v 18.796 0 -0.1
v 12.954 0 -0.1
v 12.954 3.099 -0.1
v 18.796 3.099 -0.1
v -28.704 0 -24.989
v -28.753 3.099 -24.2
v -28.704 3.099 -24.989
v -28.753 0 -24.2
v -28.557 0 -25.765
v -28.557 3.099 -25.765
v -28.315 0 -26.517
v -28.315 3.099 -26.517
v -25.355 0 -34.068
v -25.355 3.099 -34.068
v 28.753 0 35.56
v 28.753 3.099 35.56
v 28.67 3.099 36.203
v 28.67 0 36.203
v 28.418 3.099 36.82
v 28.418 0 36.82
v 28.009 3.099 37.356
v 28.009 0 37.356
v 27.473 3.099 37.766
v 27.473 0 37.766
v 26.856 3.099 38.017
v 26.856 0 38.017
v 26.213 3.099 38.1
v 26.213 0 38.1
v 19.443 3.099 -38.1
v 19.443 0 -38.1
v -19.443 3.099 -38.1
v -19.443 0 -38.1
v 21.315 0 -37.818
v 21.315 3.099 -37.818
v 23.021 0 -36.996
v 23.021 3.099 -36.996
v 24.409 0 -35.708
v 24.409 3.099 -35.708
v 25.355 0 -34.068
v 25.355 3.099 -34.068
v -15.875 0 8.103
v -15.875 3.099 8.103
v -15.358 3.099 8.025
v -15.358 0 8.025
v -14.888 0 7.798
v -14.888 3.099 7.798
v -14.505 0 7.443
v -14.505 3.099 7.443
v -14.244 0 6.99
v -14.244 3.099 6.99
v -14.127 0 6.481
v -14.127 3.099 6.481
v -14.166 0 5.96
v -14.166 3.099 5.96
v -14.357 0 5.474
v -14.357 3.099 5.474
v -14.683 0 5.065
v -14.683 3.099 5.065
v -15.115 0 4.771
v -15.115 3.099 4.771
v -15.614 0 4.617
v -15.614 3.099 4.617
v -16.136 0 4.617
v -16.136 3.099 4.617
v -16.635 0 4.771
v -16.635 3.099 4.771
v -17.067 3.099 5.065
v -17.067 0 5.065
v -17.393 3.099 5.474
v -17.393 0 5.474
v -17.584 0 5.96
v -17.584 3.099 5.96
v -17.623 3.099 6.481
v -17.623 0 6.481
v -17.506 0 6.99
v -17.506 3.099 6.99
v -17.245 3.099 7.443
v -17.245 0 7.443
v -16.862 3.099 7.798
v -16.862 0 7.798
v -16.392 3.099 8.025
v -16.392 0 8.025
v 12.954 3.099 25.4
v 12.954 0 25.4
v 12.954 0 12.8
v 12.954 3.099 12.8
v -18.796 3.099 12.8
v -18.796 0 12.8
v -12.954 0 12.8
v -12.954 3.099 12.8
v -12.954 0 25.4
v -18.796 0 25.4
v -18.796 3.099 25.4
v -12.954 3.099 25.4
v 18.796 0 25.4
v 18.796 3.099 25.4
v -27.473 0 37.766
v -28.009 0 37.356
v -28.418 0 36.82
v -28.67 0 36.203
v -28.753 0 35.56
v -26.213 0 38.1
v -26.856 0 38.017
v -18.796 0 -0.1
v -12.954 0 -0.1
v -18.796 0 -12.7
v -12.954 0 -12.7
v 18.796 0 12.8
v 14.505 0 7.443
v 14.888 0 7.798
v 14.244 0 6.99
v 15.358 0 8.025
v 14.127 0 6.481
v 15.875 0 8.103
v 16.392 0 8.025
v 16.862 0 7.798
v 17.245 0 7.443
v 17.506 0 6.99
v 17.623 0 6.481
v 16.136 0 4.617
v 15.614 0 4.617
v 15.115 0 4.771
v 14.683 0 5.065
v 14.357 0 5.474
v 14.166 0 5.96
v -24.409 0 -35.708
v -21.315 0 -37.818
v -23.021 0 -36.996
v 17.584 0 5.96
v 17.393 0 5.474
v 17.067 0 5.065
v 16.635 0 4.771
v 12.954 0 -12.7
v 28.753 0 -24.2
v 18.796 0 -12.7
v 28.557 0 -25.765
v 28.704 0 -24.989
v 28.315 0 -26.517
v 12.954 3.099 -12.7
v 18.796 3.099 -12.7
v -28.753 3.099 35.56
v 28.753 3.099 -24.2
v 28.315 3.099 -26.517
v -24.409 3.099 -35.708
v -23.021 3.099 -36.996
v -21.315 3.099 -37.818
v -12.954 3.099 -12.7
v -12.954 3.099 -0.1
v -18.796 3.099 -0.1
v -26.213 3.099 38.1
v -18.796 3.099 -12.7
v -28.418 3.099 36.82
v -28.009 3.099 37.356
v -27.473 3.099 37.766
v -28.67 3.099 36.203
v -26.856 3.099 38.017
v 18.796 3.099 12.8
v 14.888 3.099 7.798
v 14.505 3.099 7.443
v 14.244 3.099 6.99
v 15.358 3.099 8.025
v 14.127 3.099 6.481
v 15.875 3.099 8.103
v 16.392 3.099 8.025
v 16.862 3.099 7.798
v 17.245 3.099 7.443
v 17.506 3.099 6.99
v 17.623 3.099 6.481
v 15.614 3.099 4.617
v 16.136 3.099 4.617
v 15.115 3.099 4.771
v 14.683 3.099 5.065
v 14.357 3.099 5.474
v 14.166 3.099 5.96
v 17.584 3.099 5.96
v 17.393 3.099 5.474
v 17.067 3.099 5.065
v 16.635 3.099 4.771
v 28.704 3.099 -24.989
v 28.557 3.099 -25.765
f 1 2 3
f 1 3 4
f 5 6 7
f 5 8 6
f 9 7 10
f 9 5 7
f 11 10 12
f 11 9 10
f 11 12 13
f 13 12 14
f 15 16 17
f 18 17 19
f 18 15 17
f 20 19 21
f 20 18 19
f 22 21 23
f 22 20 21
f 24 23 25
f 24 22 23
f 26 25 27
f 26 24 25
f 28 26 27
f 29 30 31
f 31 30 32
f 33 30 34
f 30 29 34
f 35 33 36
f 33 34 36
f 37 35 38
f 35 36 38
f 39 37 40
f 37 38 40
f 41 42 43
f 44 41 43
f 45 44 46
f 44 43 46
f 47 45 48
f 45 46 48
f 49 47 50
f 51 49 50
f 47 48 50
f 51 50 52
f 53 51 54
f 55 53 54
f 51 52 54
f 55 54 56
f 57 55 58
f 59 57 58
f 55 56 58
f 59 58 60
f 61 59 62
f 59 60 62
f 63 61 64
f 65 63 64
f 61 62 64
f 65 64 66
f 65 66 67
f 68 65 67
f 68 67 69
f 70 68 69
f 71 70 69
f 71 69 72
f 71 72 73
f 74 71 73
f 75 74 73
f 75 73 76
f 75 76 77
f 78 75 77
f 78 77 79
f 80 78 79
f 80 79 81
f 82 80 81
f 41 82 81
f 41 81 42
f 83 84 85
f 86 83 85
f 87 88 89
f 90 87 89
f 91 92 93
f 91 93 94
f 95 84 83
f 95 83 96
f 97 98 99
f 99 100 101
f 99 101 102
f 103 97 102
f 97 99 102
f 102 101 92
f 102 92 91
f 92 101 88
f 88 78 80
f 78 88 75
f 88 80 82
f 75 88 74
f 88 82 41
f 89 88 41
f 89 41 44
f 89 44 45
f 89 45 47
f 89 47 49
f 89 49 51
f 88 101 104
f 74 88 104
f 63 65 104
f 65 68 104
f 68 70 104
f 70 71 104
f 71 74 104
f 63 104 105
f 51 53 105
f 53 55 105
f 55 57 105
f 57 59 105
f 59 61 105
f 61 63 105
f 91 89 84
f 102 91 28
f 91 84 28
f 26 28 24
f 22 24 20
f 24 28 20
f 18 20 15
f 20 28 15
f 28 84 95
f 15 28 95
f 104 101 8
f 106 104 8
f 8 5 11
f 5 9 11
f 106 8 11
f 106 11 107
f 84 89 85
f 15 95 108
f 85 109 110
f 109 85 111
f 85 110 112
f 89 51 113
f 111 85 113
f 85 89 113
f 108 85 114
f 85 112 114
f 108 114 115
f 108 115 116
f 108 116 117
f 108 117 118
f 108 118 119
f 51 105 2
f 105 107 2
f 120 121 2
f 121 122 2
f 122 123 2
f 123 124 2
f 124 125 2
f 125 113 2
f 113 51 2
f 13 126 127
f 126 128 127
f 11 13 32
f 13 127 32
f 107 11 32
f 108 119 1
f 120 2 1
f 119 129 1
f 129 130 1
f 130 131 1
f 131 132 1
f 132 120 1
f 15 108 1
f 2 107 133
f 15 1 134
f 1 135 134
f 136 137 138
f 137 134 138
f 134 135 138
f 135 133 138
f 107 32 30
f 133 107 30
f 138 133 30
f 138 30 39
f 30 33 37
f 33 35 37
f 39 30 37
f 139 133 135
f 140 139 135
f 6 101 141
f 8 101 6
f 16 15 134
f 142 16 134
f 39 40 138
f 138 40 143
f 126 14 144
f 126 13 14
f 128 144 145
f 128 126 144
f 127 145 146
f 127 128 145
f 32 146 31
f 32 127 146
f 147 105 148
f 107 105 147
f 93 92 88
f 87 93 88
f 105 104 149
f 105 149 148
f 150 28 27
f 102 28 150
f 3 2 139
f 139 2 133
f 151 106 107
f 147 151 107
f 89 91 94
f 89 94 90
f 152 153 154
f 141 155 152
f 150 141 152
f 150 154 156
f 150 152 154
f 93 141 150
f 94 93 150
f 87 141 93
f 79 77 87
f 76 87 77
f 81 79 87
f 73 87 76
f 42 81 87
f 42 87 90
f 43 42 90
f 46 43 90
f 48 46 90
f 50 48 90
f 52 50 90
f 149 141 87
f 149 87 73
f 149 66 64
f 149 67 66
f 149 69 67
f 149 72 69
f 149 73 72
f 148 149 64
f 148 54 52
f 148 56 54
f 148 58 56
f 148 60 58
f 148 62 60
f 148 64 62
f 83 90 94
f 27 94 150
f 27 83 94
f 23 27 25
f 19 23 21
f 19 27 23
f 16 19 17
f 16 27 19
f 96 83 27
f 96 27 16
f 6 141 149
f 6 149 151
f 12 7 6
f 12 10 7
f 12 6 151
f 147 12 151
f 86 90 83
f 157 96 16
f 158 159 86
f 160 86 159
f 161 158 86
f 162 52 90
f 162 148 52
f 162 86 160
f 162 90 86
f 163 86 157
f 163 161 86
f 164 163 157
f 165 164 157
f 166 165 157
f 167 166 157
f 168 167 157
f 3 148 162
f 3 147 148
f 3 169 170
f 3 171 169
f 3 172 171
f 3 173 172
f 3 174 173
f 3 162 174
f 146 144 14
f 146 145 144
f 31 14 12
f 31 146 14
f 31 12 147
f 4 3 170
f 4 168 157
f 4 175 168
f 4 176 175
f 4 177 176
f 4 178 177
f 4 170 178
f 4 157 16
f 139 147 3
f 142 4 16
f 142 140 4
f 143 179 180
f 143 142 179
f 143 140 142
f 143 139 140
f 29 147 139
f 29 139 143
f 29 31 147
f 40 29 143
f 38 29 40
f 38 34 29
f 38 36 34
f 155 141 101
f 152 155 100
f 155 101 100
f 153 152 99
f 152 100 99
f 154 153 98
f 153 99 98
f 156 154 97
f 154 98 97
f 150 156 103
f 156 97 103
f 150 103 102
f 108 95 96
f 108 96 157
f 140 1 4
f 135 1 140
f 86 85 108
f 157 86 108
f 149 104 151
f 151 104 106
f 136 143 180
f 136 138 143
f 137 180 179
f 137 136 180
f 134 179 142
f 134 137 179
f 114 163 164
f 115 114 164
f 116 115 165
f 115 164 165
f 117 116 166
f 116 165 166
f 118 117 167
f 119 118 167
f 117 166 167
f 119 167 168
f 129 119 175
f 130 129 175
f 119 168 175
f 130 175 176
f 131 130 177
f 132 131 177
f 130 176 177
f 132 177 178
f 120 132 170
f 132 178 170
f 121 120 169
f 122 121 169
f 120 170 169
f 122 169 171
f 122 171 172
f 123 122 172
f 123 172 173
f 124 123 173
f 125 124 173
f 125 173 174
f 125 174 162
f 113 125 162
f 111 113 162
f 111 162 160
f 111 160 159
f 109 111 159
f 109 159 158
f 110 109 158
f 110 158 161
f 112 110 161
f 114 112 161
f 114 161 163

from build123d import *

# Parameters (mm, degrees)
SKETCH1_W           = 5.842
SKETCH1_H           = 12.6
BOSS_EXTRUDE1_DEPTH = 3.0988
SKETCH2_R           = 1.7526
CUT_EXTRUDE1_DEPTH  = 59.454820753
FILLET1_R           = 6.35
SKETCH3_W           = 58.835231844
SKETCH3_H           = 12.7
CUT_EXTRUDE2_DEPTH  = 59.454820753
FILLET2_R           = 2.54
SKETCH4_W           = 76.889579371
SKETCH4_H           = 12.7
CUT_EXTRUDE3_DEPTH  = 59.454820895
FILLET3_R           = 6.35


with BuildPart() as part:
    # Sketch1 → Boss-Extrude1 (new body)
    with BuildSketch(Plane(origin=(0, 0, 0), x_dir=(1, 0, 0), z_dir=(0, 1, 0))):
        Polygon((-12.954, -50.8), (12.954, -50.8), (16.0528, -50.8), (28.7528, -50.8), (28.7528, 50.8), (16.0528, 50.8), (12.954, 50.8), (-12.954, 50.8), (-16.0528, 50.8), (-28.7528, 50.8), (-28.7528, -50.8), (-16.0528, -50.8), align=None)
        with Locations((-15.875, -19.1)):
            Rectangle(SKETCH1_W, SKETCH1_H, mode=Mode.SUBTRACT)
        with Locations((15.875, -19.1)):
            Rectangle(SKETCH1_W, SKETCH1_H, mode=Mode.SUBTRACT)
        with Locations((-15.875, 6.4)):
            Rectangle(SKETCH1_W, SKETCH1_H, mode=Mode.SUBTRACT)
        with Locations((15.875, 6.4)):
            Rectangle(SKETCH1_W, SKETCH1_H, mode=Mode.SUBTRACT)
    extrude(amount=BOSS_EXTRUDE1_DEPTH)

    # Sketch2 → Cut-Extrude1 (cut, through all)
    with BuildSketch(Plane(origin=(0, 3.0988, 0), x_dir=(1, 0, 0), z_dir=(0, 1, 0))):
        Polygon((-28.7528, -50.8), (-18.796, -50.8), (-28.7528, -38.1), align=None)
        Polygon((28.7528, -38.1), (18.796, -50.8), (28.7528, -50.8), align=None)
        Polygon((-28.7528, 50.8), (-28.7528, 25.4), (-18.796, 50.8), align=None)
        Polygon((18.796, 50.8), (28.7528, 25.4), (28.7528, 50.8), align=None)
        with Locations((-15.875, -6.35)):
            Circle(SKETCH2_R)
        with Locations((15.875, -6.35)):
            Circle(SKETCH2_R)
    extrude(amount=-CUT_EXTRUDE1_DEPTH, mode=Mode.SUBTRACT)

    # Fillet1
    fillet1_edges = [part.edges().sort_by_distance(p)[0] for p in [
        (18.796, 1.5494, 50.8),
        (-18.796, 1.5494, 50.8),
        (-28.7528, 1.5494, 38.1),
        (-28.7528, 1.5494, -25.4),
        (-18.796, 1.5494, -50.8),
        (18.796, 1.5494, -50.8),
        (28.7528, 1.5494, -25.4),
        (28.7528, 1.5494, 38.1),
    ]]
    fillet(fillet1_edges, radius=FILLET1_R)

    # Sketch3 → Cut-Extrude2 (cut, through all)
    with BuildSketch(Plane(origin=(0, 0, 0), x_dir=(-1, 0, 0), z_dir=(0, -1, 0))):
        with Locations((0.664815922, -44.45)):
            Rectangle(SKETCH3_W, SKETCH3_H)
    extrude(amount=-CUT_EXTRUDE2_DEPTH, mode=Mode.SUBTRACT)

    # Fillet2
    fillet2_edges = [part.edges().sort_by_distance(p)[0] for p in [
        (-28.362298152, 1.5494, 38.1),
        (28.362298152, 1.5494, 38.1),
    ]]
    fillet(fillet2_edges, radius=FILLET2_R)

    # Sketch4 → Cut-Extrude3 (cut, through all)
    with BuildSketch(Plane(origin=(0, 0, 0), x_dir=(-1, 0, 0), z_dir=(0, -1, 0))):
        with Locations((3.167610928, 44.45)):
            Rectangle(SKETCH4_W, SKETCH4_H)
    extrude(amount=-CUT_EXTRUDE3_DEPTH, mode=Mode.SUBTRACT)

    # Fillet3
    fillet3_edges = [part.edges().sort_by_distance(p)[0] for p in [
        (23.7744, 1.5494, -38.1),
        (-23.7744, 1.5494, -38.1),
    ]]
    fillet(fillet3_edges, radius=FILLET3_R)


solid = part.part
